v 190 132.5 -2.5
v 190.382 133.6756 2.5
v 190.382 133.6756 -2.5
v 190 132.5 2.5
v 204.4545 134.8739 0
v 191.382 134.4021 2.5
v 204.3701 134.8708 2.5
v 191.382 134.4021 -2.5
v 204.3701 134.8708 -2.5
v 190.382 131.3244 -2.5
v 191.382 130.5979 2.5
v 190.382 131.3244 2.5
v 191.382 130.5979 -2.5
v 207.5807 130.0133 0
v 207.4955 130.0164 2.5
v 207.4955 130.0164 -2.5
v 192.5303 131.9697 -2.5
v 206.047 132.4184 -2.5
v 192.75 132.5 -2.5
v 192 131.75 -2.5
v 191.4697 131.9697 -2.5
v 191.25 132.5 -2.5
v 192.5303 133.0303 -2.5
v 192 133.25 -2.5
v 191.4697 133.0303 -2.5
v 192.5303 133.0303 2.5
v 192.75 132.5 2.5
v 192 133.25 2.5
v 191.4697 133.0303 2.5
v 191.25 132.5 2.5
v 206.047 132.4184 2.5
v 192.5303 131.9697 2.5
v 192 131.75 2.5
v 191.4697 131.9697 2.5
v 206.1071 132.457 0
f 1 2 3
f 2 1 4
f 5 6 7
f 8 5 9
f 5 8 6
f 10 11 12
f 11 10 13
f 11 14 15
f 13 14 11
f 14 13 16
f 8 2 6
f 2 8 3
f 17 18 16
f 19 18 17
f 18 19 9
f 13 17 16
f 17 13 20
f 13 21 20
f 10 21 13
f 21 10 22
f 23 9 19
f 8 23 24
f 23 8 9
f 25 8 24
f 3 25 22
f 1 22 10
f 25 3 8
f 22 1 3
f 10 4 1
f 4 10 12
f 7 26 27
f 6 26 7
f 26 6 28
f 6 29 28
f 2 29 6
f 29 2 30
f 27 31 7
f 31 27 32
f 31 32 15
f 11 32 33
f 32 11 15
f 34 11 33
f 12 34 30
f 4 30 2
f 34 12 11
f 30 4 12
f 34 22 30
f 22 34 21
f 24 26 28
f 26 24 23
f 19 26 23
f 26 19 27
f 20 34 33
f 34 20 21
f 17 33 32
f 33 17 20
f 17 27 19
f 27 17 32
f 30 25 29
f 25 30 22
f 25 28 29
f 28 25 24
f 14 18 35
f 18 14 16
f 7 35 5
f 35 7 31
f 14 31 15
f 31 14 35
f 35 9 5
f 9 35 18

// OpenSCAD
// file: ../motors/MN5212.scad
use <../utils.scad>

module MN5212(){

	render(){
		translate([0,0, 42.5 / 2 - 23 / 2 - 4.9 - 6])
			cylinder(
				h = 23,
				r = 59 / 2,
				$fa = fa(59 / 2),
				center = true);
		translate([0,0, 42.5 / 2 - 4.9 / 2 - 6])
			cylinder(
				h = 4.9,
				r1 = 59 / 2,
				r2 = 24.8 / 2,
				$fa = fa(59 / 2),
				center = true);
		translate([0,0, - 42.5 / 2 + 5.6 / 2 + 3])
			cylinder(
				h = 5.6,
				r1 = 44 / 2,
				r2 = 59 / 2,
				$fa = fa(59 / 2),
				center = true);
		translate([0, 0, 42.5 / 2 - 3])
			cylinder(
				h = 6,
				r = 4 / 2,
				$fa = fa(4 / 2),
				center = true);
		translate([0, 0, - 42.5 / 2 + 1.5])
			cylinder(
				h = 3,
				r = 6 / 2,
				$fa = fa(6 / 2),
				center = true);
	}

}
// file: ../servos/HS_5065MG.scad
use <../utils.scad>

module HS_5065MG(){

	length = 23.75;
	width = 11.68;
	depth = 20.32;
	wing_width = 32.38;
	wing_thick = 3.43;
	shaft_offset = 6;
	hole_spacing = 28.32;
	shaft_height = 26.16;
	shaft_length = 2;

	module mounting_hole(){
		mh_rad = 2 / 2;
		translate(
			[
				hole_spacing / 2,
				0,
				depth / 2 - wing_thick / 2
			])
			cylinder(h = 5, r = mh_rad, $fa = fa(mh_rad), center = true);
	}

	difference(){
		union(){
			cube([length, width, depth], center = true);
			translate([0, 0, depth / 2 - wing_thick / 2])
				cube([wing_width, width, wing_thick], center = true);
			translate(
				[
					- length / 2 + shaft_offset,
					0,
					shaft_height - length / 2 + shaft_length / 2
				])
				cylinder(
					h = shaft_length,
					r = 1.5,
					$fa = fa(1.5),
					center = true);
		}	union(){

			mounting_hole();
			mirror() mounting_hole();
		}
	}
}

HS_5065MG();
// file: ../servos/LS_0006_servo.scad
// Author Michael Marques (DrYerzinia)

use <../utils.scad>

module ls_0006_servo(){
	
	length = 21.4;
	depth = 19.9;
	thickness = 11.65;

	gear_height = 2.6;
	gear_bump_height = 0.7;
	gear_bump_diameter = 1.97;
	gear_outer_bump_diameter = 6;
	gear_bump_offset = 12.2;

	shaft_height = 2.4;
	shaft_diameter = 3.74;
	shaft_offset = thickness / 2;
	shaft_screw_diameter = 1.3;
	
	wing_outer_width = 8.5;
	wing_top_off = 3.8;
	wing_length = 3.8;
	wing_thickness = 1.2;
	wing_hole_diameter = 1.85;
	wing_hole_edge_dist = 2;

	module wing_hole(){
		translate(
			[
				length / 2 + wing_hole_edge_dist,
				0,
				depth/2 - wing_top_off - wing_thickness / 2
			])
			cylinder(
				h = wing_thickness + 1,
				r = wing_hole_diameter / 2,
				$fn = 16,
				center = true);
	}

	module wing(){
		translate(
			[
				length / 2,
				thickness / 2,
				depth/2 - wing_top_off - wing_thickness
			])
			rotate([0,0,-90])
				trapezoid(
					thickness,
					wing_outer_width,
					wing_length,
					wing_thickness);
	}

	// Body
	cube([length, thickness, depth], center = true);

	difference(){
		union(){

			wing();
			mirror() wing();

			// Gear Bumps
			translate([0, 0, depth/2 + gear_height / 2]){
				translate([length / 2 - gear_bump_offset, 0, 0])
					cylinder(
						h = gear_height,
						r = gear_outer_bump_diameter / 2,
						$fn = 16,
						center = true);
				translate([length / 2 - gear_bump_offset, 0, gear_height/2 + gear_bump_height / 2])
					cylinder(
						h = gear_bump_height,
						r = gear_bump_diameter / 2,
						$fn = 16,
						center = true);
				translate([length / 2 - shaft_offset, 0, 0])
					cylinder(
						h = gear_height,
						r = thickness / 2,
						$fn = 32,
						center = true);
				// Shaft
				translate([length / 2 - shaft_offset, 0, gear_height])
					cylinder(
						h = shaft_height,
						r = shaft_diameter / 2,
						$fn = 16,
						center = true);
			}

		}
		union(){

			wing_hole();
			mirror() wing_hole();

			// Shaft_hole
			translate(
				[
					length / 2 - shaft_offset,
					0,
					depth/2 + gear_height * (3 / 2) + 0.5])
				cylinder(
					h = shaft_height + 1,
					r = shaft_screw_diameter / 2,
					$fn = 16,
					center = true);

		}
	}

}

module translate_ls_0006_attachment(){

	length = 21.4;
	thickness = 11.65;
	shaft_offset = thickness / 2;
	depth = 19.9;
	float = 3.3;

	translate([length / 2 - shaft_offset, 0, depth / 2 + float])
		children();

}

module bar_attachment(){

	height = 3.75;
	bar_length = 14.7;
	bar_thickness = 1.6;
	inner_radius = 5.9;
	outer_radius = 3.95;
	shaft_diameter = 3.7;
	upper_void_diameter = 4.8;
	screw_diameter = 2;
	hole_spacing = 2;
	hole_4_diameter = 1.2;
	hole_diameter = 1;
	hole_start_off = 4.7;
	top_void_depth = 0.67;
	bottom_void_depth = 1.84;

	translate([0, 0, height / 2]){
		difference(){
			union(){

				translate([0, inner_radius / 2, height / 2 - bar_thickness])
					rotate([0,0,-90])
						trapezoid(
							inner_radius,
							outer_radius,
							bar_length,
							bar_thickness);

				cylinder(
					h = height,
					r = inner_radius / 2,
					$fn = 16,
					center = true);

				translate([bar_length, 0, height / 2 - bar_thickness / 2])
					cylinder(
						h = bar_thickness,
						r = outer_radius / 2,
						$fn = 16,
						center = true);

			}
			union(){
				// screwhole
				cylinder(
					h = height + 1,
					r = screw_diameter / 2,
					$fn = 16,
					center = true);
				// voids
				translate([0, 0, height / 2 - top_void_depth / 2 + 0.5])
					cylinder(
						h = top_void_depth + 1,
						r = upper_void_diameter / 2,
						$fn = 16,
						center = true);
				translate([0, 0,  - bottom_void_depth / 2 - 0.5])
					cylinder(
						h = bottom_void_depth + 1,
						r = shaft_diameter / 2,
						$fn = 16,
						center = true);

				for(i = [0:4]){
					dia = (i != 3) ? hole_diameter : hole_4_diameter;
					translate(
						[
							hole_start_off + hole_spacing * i,
							0,
							height / 2 - bar_thickness / 2])
						cylinder(
							h = bar_thickness + 1,
							r = dia / 2,
							$fn = 16,
							center = true);
				}

			}
		}
	}

}

ls_0006_servo();
translate_ls_0006_attachment() bar_attachment();
// file: ../servos/parallax_continuous_rotation_servo.scad
// Author Michael Marques (DrYerzinia)

module parallax_continuous_rotation_servo(){

	depth = 37.7;
	length = 40.75;
	width = 19.75;

	mount_height = 2.7;
	mount_extent = 6.1;
	mount_from_top = 7.7;

	mount_hole_diameter = 4.46;
	mount_hole_spacing = 14.4 - mount_hole_diameter;

	shaft_diameter = 5.8;
	shaft_offset = 10;
	shaft_length = 3.5;

	module mounting_hole(){

			translate(
				[
					length / 2 + 5,
					mount_hole_spacing / 2,
					depth / 2 - mount_height / 2 - mount_from_top
				]
				)
				cylinder(
					h = mount_height + 1,
					r = mount_hole_diameter / 2,
					$fn=16,
					center = true);
	}

	difference(){
		union(){

			// Body
			cube([length,width,depth], center = true);

			// Mounting wings
			translate(
				[
					0,
					0,
					depth / 2 - mount_height / 2 - mount_from_top
				])
				cube(
					[
						length + mount_extent * 2,
						width,
						mount_height
					],
					center = true);

			// Shaft
			translate(
				[
					length / 2 - shaft_offset,
					0,
					depth / 2 + shaft_length / 2
				]
				)
				cylinder(
					h = shaft_length,
					r = shaft_diameter / 2,
					$fn = 16,
					center = true
				);

		}
		union(){

			// Mounting Holes
			mounting_hole();
			mirror()
				mounting_hole();

			translate([0,-mount_hole_spacing,0]){
				mounting_hole();
				mirror()
					mounting_hole();
			}
		}
	}

}

module translate_shaft(){

	depth = 37.7;
	length = 40.75;

	shaft_offset = 10;

	translate(
		[
			length / 2 - shaft_offset,
			0,
			depth / 2
		])
		children();
}

module round_servo_attachment(){

	height = 6;
	diameter = 20.8;
	inner_diameter = 8.6;
	plate_thickness = 2.45;

	float = 2;

	depth = 37.7;
	length = 40.75;

	shaft_offset = 10;

	plate_hole_spacing = 14.5;
	plate_hole_diameter = 1.4;
	plate_hole_minor_spacing = 3.5;

	screw_hole_diameter = 3;

	inner_diameter = 8;
	
	top_depth = 1.8;
	bottom_depth = 3.4;

	void_diameter = 5.8;

	module plate_hole(){
		cylinder(
			h = plate_thickness + 1,
			r = plate_hole_diameter / 2,
			$fn = 16,
			center = true
		);
	}

	module plate_hole_group(){
		translate([0, 0, height / 2 - plate_thickness / 2]){
			translate([0, plate_hole_spacing / 2, 0]){
					plate_hole();
					translate([- plate_hole_minor_spacing, 0, 0])
						plate_hole();
					translate([  plate_hole_minor_spacing, 0, 0])
						plate_hole();
			}
		}
	}

	translate(
		[
			length / 2 - shaft_offset,
			0,
			depth / 2 + height / 2 + float
		]
		)
		difference(){

			union(){

				// inner shaft
				cylinder(
					h = height,
					r = inner_diameter / 2,
					$fn = 16,
					center = true
				);

				// top
				translate([0, 0, height / 2 - plate_thickness / 2])
					cylinder(
						h = plate_thickness,
						r = diameter / 2,
						$fn = 32,
						center = true
					);
			}

			union(){

				// plate holes
				for(ang = [0:3]){
					rotate([0,0, ang * 90])
						plate_hole_group();
				}

				// screw hole
				cylinder(
					h = height + 1,
					r = screw_hole_diameter / 2,
					$fn = 16,
					center = true
				);

				// inner voids
				translate([0, 0, height / 2 - top_depth / 2 + 1])
					cylinder(
						h = top_depth + 1,
						r = void_diameter / 2,
						$fn = 16,
						center = true
					);
				translate([0, 0, -1])
					cylinder(
						h = bottom_depth + 1,
						r = void_diameter / 2,
						$fn = 16,
						center = true
					);

			}

		}

}

parallax_continuous_rotation_servo();
round_servo_attachment();
// file: ../hardware.scad
 // Author Michael Marques (DrYerzinia)

// http://www.ebay.com/itm/10-PCS-683-3x7x2-mm-Metal-OPEN-PRECISION-Miniature-Ball-Bearing-3-7-2-/291206307942?hash=item43cd3fa066:m:mCi6eovrGVk_CjIUjlhw8yg
// E-Bay empire.rc

module washer_M3_7x3_2x0_5mm(){

	difference(){
		cylinder(
			h = 0.5,
			r = 7 / 2,
			$fn = 16,
			center = true);
		cylinder(
			h = 0.5 + 0.1,
			r = 3.2 / 2,
			$fn = 16,
			center = true);
	}

}

module bearing_3x7x2mm(){

	difference(){
		cylinder(
			h = 2,
			r = 7 / 2,
			$fn = 16,
			center = true);
		cylinder(
			h = 2 + 1,
			r = 3 / 2,
			$fn = 16,
			center = true);
	}

}

module bearing_5x8x2_5mm(){

	difference(){
		cylinder(
			h = 2.5,
			r = 8 / 2,
			$fn = 16,
			center = true);
		cylinder(
			h = 2.5 + 1,
			r = 5 / 2,
			$fn = 16,
			center = true);
	}

}

module bearing_8x16x5mm(){

	difference(){
		cylinder(
			h = 5,
			r = 16 / 2,
			$fn = 16,
			center = true);
		cylinder(
			h = 5 + 1,
			r = 8 / 2,
			$fn = 16,
			center = true);
	}

}


bearing_5x8x2_5mm();
// file: ../utils.scad
// http://forum.openscad.org/Creating-pie-pizza-slice-shape-need-a-dynamic-length-array-td3148.html

module pie_slice(r, start_angle, end_angle) {
    R = r * sqrt(2) + 1;
    a0 = (4 * start_angle + 0 * end_angle) / 4;
    a1 = (3 * start_angle + 1 * end_angle) / 4;
    a2 = (2 * start_angle + 2 * end_angle) / 4;
    a3 = (1 * start_angle + 3 * end_angle) / 4;
    a4 = (0 * start_angle + 4 * end_angle) / 4;
    if(end_angle > start_angle)
        intersection() {
        circle(r, $fa = fa(r));
        polygon([
            [0,0],
            [R * cos(a0), R * sin(a0)],
            [R * cos(a1), R * sin(a1)],
            [R * cos(a2), R * sin(a2)],
            [R * cos(a3), R * sin(a3)],
            [R * cos(a4), R * sin(a4)],
            [0,0]
       ]);
    }
}

// https://github.com/openscad/openscad/issues/29

module rotate_about(v,a) {
	translate(v) rotate(a) translate(-v) children(0);
}

module rotate_about_axis(v, ang, axis) {
	translate(v) rotate(ang, axis) translate(-v) children(0);
}

// https://github.com/robofun/openscad-utils/blob/master/trapezoid.scad

module trapezoid(width_base, width_top,height,thickness) {
	

  linear_extrude(height = thickness) polygon(points=[[0,0],[width_base,0],[width_base-(width_base-width_top)/2,height],[(width_base-width_top)/2,height]], paths=[[0,1,2,3]]); 
  
}

// http://forum.openscad.org/fe-Tolerance-based-arc-approximation-td14212.html

function fa(r)=($fn>0)?360/$fn:($fe>0)?($fe<r)?min(45,2*acos(1-$fe/r)):45:$fa; 
// file: ../render_settings.scad
// Author Michael Marques (DrYerzinia)

// Lulzbot Mini tolerances
// x/y 0.1mm
// z   0.05mm
//
// 0.1mm   preview tolerance
// 0.025mm export  tolerance

$fs = 0.01;
$fn = undef;
$fa = 360 / 5;

$fe = 0.025;	// export
// main file
// Author Michael Marques (DrYerzinia)

include <../render_settings.scad>

use <../BB8.scad>

Door_P6_servo_lever();
